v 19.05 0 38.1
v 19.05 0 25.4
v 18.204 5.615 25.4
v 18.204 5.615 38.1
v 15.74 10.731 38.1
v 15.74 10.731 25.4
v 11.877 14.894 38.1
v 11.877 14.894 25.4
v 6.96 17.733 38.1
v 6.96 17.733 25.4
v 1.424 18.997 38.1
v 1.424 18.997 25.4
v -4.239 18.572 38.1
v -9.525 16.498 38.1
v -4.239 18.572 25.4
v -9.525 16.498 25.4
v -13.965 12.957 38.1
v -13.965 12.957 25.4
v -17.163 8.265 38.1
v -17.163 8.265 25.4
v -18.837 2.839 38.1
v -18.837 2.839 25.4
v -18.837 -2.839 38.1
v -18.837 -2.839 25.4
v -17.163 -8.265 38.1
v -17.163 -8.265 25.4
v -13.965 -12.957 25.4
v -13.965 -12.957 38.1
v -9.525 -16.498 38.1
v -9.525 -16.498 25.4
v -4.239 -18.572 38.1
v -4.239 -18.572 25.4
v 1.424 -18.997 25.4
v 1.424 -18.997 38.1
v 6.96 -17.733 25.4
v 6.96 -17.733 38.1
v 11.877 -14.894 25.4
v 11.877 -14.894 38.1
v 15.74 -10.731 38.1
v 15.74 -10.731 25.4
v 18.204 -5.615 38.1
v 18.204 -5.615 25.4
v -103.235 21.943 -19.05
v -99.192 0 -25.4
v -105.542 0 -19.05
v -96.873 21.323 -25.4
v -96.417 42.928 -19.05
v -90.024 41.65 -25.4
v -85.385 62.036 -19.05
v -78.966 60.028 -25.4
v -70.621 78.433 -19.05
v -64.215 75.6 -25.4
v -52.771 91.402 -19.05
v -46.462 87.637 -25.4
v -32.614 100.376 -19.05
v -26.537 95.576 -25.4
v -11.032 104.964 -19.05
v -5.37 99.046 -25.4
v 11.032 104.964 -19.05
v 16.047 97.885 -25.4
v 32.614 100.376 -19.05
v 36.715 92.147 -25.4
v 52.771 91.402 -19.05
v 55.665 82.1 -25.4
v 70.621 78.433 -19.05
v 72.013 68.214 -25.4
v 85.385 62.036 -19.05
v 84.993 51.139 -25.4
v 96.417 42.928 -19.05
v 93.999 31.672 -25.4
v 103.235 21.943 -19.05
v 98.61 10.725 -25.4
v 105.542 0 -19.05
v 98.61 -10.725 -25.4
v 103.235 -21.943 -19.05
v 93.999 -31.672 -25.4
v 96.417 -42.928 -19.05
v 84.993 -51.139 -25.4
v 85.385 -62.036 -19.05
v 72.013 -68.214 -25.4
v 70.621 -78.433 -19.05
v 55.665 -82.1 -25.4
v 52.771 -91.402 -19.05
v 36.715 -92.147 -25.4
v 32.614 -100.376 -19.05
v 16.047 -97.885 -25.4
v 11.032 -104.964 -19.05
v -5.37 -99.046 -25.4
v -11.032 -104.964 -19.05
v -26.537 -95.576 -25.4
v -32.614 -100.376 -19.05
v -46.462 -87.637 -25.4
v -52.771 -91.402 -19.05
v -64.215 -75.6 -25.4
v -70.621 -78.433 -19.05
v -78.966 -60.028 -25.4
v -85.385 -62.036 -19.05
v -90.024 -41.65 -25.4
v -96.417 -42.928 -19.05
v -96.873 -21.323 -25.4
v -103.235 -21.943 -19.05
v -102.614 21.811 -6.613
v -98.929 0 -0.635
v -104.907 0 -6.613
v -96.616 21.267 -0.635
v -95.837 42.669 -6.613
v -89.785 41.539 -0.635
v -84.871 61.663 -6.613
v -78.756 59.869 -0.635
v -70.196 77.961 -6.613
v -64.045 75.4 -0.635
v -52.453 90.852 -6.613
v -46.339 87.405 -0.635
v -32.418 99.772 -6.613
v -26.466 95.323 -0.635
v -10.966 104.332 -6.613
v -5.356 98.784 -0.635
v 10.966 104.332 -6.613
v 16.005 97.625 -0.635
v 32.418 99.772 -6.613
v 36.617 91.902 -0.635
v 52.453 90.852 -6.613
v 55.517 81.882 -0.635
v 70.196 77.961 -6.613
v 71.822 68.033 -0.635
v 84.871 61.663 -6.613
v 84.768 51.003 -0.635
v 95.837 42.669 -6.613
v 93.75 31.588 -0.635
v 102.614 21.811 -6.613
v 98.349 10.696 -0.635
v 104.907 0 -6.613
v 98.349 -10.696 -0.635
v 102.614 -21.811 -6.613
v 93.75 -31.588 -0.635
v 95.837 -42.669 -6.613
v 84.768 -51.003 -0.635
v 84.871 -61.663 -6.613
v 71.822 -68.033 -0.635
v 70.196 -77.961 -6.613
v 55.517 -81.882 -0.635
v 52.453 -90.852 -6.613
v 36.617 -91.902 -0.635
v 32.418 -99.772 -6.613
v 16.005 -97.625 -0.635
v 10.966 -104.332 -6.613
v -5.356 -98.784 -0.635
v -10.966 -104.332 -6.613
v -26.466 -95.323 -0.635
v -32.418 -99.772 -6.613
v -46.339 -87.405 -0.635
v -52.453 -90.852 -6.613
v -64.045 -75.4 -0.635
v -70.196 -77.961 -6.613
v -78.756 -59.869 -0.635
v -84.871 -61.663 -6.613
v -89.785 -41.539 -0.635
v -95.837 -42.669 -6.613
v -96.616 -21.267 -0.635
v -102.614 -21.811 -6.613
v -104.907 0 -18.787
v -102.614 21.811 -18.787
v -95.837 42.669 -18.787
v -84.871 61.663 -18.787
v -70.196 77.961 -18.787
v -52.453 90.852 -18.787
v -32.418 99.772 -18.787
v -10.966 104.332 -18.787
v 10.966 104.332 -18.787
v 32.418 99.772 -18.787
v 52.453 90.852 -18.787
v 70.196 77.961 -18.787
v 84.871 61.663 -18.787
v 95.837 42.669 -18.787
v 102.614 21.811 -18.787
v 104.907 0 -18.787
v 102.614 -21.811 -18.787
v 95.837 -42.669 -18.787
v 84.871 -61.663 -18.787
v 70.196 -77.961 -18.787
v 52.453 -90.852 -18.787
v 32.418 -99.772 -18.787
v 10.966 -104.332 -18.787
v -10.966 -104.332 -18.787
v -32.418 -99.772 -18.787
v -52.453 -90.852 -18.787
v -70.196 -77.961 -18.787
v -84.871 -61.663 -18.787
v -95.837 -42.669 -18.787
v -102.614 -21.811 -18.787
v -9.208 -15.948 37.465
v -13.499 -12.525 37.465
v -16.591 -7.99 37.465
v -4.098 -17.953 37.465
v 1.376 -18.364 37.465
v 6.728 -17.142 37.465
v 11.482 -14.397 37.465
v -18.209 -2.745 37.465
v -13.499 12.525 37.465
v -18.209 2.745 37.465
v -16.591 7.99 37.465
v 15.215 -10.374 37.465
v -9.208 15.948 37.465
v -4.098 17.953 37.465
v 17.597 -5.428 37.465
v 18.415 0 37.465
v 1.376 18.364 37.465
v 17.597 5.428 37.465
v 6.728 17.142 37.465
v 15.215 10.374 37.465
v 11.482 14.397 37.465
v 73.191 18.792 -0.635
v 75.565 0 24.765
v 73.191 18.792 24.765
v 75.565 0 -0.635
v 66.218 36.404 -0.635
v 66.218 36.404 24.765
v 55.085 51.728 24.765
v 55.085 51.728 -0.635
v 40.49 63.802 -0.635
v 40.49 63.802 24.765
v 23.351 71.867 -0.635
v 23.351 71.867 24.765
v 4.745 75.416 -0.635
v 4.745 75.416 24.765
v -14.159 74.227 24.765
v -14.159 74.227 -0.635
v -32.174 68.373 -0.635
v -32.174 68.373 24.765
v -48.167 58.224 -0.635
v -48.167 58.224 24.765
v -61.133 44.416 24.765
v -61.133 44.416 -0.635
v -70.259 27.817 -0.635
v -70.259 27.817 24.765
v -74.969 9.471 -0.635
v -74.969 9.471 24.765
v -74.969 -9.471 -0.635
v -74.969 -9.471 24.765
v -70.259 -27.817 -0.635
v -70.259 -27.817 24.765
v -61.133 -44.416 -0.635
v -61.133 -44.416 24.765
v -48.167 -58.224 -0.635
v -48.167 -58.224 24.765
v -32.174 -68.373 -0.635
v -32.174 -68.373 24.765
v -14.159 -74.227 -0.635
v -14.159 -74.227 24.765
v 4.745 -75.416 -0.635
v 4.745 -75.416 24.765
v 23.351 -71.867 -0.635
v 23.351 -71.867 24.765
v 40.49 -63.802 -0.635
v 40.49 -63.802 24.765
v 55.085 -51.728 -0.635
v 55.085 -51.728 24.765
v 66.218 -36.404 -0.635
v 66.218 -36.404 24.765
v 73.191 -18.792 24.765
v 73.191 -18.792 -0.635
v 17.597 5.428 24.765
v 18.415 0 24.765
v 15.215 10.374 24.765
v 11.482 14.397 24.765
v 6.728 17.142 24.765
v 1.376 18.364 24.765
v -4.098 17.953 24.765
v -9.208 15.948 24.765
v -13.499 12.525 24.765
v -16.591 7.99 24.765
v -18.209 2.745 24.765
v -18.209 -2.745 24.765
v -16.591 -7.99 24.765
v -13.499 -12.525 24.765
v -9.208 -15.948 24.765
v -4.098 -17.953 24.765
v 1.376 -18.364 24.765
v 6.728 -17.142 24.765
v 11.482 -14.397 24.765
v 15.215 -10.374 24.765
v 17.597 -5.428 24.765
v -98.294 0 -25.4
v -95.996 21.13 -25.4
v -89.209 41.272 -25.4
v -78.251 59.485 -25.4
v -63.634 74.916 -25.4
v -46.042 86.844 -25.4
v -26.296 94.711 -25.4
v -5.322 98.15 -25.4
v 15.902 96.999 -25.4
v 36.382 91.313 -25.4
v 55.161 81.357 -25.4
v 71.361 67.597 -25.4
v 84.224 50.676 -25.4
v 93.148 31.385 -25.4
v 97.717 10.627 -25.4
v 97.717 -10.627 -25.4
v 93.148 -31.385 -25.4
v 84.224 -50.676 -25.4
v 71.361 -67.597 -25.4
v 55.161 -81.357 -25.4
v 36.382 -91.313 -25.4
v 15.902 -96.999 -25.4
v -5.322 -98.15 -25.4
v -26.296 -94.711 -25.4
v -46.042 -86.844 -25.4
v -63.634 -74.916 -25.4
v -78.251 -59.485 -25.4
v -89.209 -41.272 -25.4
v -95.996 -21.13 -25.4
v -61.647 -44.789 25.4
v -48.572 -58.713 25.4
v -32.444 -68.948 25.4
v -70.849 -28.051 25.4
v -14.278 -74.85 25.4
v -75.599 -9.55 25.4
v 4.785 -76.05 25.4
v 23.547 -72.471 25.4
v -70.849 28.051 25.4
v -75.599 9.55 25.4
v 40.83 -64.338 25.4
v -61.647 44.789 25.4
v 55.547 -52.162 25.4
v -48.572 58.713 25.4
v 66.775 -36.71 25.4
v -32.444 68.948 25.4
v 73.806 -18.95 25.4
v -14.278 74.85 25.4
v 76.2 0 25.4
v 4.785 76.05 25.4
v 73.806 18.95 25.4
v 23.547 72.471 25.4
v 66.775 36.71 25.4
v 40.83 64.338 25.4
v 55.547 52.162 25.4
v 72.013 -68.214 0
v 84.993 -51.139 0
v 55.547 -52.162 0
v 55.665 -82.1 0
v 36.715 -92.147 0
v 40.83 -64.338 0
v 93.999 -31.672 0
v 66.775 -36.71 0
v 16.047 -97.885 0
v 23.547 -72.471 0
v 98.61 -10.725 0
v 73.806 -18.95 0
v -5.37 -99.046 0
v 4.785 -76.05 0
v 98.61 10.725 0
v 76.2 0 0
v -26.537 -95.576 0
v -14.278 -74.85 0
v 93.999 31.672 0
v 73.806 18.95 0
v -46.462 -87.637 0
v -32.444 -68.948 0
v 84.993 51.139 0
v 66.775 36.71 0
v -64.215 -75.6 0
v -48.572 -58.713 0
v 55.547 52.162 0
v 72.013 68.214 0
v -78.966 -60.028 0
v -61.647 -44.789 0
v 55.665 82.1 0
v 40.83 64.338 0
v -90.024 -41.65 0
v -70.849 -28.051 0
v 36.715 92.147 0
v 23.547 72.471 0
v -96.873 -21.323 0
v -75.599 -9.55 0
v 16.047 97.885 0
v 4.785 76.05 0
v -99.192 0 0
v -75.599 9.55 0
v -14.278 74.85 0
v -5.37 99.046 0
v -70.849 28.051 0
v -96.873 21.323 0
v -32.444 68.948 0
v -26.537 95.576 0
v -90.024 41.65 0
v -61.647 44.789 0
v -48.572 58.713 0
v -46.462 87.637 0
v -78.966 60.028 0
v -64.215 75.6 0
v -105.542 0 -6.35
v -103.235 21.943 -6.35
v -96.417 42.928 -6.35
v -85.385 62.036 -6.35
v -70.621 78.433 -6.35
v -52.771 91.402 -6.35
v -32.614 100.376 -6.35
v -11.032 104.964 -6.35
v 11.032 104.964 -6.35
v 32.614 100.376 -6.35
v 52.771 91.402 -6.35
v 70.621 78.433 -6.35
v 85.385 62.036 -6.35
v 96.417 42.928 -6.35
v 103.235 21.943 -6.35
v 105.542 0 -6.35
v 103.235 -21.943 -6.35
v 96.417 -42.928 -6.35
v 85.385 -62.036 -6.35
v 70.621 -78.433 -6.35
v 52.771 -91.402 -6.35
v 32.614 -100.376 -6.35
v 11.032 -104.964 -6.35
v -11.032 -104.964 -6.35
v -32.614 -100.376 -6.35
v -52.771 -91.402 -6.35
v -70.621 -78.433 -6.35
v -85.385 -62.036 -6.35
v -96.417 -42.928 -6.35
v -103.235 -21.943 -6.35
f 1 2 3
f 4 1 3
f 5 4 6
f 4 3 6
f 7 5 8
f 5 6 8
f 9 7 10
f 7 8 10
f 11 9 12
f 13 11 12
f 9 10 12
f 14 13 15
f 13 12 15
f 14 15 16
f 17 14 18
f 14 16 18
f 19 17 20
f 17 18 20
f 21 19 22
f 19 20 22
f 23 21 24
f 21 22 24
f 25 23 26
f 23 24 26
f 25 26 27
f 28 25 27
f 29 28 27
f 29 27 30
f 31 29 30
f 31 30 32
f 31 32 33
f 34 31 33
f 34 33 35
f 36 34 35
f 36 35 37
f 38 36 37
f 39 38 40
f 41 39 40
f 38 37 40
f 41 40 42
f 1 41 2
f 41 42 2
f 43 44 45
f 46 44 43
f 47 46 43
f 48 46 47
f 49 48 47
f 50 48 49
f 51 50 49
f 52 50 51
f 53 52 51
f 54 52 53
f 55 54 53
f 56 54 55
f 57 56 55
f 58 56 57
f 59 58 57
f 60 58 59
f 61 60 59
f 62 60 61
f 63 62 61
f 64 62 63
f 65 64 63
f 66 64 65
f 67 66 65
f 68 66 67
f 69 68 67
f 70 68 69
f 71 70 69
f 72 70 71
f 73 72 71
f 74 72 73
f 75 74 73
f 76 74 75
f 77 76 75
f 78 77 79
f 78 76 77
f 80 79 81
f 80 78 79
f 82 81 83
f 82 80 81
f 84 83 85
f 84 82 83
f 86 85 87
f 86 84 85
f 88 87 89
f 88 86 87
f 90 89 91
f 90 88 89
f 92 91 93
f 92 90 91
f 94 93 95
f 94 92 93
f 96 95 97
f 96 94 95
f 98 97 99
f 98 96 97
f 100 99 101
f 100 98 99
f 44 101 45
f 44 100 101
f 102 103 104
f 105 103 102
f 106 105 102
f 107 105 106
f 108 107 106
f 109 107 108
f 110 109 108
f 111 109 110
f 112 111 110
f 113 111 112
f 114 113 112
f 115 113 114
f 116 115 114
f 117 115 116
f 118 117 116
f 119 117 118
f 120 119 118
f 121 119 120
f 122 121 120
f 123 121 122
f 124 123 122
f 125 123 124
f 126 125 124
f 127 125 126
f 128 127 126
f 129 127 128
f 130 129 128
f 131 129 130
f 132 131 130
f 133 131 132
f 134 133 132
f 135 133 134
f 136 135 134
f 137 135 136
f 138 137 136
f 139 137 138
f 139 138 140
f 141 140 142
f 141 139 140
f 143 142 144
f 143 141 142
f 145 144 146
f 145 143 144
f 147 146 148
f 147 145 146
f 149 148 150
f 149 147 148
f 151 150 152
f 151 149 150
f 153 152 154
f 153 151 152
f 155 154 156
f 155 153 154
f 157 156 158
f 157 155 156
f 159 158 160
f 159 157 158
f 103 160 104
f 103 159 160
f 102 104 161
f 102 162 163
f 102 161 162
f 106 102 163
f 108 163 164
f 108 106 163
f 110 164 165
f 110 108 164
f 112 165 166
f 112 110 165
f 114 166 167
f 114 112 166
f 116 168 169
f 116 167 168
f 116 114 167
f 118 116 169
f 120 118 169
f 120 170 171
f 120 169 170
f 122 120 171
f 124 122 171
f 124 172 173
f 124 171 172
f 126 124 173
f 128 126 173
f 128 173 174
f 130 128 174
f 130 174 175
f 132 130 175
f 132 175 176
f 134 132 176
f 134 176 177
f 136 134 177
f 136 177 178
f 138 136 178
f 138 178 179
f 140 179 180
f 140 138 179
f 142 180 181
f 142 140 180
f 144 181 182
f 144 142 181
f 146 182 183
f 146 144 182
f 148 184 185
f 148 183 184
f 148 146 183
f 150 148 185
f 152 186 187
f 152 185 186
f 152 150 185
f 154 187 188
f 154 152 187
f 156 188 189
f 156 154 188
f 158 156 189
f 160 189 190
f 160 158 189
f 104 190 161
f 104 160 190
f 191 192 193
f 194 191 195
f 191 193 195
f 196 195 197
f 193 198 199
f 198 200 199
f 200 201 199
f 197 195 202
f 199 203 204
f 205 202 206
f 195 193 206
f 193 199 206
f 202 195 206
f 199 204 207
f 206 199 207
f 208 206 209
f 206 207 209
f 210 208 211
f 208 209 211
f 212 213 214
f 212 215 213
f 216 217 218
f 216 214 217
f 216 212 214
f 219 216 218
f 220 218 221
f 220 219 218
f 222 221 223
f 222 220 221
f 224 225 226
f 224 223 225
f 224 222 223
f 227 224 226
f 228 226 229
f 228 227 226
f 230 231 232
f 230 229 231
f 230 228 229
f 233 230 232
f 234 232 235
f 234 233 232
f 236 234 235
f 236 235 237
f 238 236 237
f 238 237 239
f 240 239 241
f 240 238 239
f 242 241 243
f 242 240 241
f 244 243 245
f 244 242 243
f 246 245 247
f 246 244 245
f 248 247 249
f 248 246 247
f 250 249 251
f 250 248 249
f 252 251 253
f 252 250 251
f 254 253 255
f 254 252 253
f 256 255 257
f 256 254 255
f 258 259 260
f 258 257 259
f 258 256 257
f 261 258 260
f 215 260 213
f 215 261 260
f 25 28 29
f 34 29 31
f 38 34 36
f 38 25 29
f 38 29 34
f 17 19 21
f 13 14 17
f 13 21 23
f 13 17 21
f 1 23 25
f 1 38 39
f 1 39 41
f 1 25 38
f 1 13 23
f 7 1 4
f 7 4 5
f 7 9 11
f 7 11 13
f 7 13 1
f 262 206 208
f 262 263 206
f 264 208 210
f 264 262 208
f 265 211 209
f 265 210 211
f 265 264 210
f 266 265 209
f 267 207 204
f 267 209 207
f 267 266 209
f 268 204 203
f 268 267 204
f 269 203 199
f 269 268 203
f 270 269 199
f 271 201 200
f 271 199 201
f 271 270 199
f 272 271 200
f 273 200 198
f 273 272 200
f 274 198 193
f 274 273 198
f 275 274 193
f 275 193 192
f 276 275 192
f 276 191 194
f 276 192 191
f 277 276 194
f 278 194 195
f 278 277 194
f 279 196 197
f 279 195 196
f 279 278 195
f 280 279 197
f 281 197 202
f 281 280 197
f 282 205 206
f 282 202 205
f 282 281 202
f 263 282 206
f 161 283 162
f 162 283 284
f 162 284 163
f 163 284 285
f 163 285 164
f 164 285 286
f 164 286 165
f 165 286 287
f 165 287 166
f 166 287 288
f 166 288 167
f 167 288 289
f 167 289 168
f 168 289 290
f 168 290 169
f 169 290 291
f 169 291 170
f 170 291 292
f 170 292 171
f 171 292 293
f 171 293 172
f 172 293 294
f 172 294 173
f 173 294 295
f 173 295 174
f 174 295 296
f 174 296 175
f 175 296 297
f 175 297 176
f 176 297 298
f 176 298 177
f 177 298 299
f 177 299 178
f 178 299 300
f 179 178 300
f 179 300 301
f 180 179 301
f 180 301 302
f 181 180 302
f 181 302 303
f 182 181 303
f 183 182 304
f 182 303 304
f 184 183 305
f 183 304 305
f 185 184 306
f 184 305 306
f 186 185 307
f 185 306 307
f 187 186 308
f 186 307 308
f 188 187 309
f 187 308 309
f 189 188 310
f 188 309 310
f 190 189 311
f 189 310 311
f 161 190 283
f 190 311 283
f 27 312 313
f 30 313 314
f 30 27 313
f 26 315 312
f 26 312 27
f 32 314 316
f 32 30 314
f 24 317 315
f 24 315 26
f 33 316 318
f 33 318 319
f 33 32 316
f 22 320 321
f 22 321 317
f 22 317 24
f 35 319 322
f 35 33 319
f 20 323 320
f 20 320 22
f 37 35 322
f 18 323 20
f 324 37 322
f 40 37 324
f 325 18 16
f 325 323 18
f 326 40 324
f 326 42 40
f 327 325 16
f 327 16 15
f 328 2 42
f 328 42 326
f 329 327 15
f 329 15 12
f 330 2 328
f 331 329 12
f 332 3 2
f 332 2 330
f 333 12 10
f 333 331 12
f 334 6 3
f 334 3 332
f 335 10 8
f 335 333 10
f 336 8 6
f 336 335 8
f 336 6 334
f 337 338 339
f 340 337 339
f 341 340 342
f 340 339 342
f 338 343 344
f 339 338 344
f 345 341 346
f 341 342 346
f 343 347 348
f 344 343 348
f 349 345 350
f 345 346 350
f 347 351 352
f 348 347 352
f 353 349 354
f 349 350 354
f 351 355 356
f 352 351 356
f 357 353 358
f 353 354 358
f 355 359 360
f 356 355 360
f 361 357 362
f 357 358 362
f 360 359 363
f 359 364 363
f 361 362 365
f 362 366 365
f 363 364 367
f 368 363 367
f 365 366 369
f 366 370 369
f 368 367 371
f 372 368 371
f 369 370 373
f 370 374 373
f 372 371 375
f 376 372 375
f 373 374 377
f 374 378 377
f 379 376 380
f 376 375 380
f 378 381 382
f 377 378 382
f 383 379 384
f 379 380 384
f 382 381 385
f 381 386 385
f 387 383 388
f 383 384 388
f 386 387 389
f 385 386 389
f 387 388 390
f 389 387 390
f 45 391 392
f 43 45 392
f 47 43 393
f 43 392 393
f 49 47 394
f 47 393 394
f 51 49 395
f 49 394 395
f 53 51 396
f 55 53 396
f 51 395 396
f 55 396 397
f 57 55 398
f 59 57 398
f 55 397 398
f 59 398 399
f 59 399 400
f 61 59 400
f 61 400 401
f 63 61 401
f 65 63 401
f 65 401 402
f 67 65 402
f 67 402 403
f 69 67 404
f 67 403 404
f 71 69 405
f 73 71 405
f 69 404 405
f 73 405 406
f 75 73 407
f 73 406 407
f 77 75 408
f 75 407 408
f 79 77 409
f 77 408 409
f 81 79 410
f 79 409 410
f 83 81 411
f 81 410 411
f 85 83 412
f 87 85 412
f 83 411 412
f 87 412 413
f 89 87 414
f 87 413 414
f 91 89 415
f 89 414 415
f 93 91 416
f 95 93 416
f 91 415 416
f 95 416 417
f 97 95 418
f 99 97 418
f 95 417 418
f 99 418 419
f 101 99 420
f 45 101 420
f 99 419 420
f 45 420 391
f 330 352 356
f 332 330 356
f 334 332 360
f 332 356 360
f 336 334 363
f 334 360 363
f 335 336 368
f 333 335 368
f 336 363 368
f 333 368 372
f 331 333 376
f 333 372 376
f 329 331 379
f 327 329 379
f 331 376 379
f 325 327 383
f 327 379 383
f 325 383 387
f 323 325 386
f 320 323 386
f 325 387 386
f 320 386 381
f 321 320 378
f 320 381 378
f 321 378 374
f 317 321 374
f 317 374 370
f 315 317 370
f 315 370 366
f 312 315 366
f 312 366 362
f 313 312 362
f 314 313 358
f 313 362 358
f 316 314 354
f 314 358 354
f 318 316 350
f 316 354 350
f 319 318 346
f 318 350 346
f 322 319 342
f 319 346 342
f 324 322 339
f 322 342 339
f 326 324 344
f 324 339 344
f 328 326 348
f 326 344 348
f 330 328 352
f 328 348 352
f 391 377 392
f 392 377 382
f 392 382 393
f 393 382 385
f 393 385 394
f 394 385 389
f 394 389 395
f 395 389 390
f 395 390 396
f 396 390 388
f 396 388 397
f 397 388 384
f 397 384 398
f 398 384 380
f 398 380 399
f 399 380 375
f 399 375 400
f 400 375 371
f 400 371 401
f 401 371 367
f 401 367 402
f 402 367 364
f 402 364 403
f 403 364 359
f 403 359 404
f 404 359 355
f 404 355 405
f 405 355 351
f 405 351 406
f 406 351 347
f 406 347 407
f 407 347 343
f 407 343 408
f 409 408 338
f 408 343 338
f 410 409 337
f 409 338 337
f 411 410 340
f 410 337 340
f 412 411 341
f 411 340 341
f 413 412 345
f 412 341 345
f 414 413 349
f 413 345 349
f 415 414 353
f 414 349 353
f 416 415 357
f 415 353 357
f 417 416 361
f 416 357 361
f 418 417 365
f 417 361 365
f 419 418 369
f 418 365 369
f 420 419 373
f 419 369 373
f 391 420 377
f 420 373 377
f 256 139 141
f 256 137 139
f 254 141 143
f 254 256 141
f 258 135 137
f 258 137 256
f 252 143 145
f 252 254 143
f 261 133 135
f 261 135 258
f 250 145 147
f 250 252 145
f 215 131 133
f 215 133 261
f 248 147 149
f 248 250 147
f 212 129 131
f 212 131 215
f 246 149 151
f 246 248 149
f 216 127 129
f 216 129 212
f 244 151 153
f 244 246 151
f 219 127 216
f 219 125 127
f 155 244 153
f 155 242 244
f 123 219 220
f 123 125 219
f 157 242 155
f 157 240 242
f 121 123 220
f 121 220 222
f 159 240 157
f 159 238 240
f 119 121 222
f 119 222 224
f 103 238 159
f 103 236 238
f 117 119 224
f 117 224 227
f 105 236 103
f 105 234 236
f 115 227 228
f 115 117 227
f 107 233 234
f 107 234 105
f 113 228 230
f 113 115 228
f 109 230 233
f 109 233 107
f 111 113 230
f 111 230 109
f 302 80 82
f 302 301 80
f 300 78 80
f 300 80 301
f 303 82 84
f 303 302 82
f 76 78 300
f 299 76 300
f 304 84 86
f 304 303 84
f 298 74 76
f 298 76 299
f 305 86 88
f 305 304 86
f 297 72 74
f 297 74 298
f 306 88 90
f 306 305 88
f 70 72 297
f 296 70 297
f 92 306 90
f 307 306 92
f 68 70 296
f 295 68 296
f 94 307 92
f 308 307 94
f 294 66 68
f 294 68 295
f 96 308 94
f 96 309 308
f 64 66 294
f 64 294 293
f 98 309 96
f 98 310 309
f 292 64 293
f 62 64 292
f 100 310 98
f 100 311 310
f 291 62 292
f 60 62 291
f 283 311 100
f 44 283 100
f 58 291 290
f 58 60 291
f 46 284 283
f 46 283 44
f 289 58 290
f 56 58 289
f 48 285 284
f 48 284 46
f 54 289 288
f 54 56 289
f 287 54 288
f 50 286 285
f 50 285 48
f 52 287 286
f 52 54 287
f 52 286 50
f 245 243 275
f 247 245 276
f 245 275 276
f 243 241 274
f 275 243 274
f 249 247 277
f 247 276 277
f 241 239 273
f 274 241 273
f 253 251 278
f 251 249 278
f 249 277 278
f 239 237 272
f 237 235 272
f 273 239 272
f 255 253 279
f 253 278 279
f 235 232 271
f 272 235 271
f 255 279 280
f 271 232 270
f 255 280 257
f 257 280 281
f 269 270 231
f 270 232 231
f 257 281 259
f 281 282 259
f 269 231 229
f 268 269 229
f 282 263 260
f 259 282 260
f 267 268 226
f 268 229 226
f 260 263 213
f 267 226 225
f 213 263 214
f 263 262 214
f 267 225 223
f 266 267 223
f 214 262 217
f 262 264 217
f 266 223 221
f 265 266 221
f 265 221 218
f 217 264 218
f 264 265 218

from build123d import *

# Parameters (mm, degrees)
SKETCH1_R           = 76.2
BOSS_EXTRUDE1_DEPTH = 25.4
SKETCH2_R           = 19.05
BOSS_EXTRUDE2_DEPTH = 12.7
SKETCH3_R           = 105.541701
BOSS_EXTRUDE4_DEPTH = 25.4
CHAMFER1_SIZE       = 6.35
SHELL1_T            = -0.635


with BuildPart() as part:
    # Sketch1 → Boss-Extrude1 (new body)
    with BuildSketch(Plane.XY):
        Circle(SKETCH1_R)
    extrude(amount=BOSS_EXTRUDE1_DEPTH)

    # Sketch2 → Boss-Extrude2 (add)
    with BuildSketch(Plane.XY.offset(25.4)):
        Circle(SKETCH2_R)
    extrude(amount=BOSS_EXTRUDE2_DEPTH)

    # Sketch3 → Boss-Extrude4 (add)
    with BuildSketch(Plane(origin=(0, 0, 0), x_dir=(-1, 0, 0), z_dir=(0, 0, -1))):
        Circle(SKETCH3_R)
    extrude(amount=BOSS_EXTRUDE4_DEPTH)

    # Chamfer1
    chamfer1_edges = [part.edges().sort_by_distance(p)[0] for p in [
        (105.541701, 0, 0),
        (105.541701, 0, -25.4),
    ]]
    chamfer(chamfer1_edges, length=CHAMFER1_SIZE)

    # Shell1
    shell1_openings = [part.faces().sort_by_distance(p)[0] for p in [
        (-99.191701, 0, -25.4),
    ]]
    offset(amount=SHELL1_T, openings=shell1_openings, kind=Kind.INTERSECTION)


solid = part.part
